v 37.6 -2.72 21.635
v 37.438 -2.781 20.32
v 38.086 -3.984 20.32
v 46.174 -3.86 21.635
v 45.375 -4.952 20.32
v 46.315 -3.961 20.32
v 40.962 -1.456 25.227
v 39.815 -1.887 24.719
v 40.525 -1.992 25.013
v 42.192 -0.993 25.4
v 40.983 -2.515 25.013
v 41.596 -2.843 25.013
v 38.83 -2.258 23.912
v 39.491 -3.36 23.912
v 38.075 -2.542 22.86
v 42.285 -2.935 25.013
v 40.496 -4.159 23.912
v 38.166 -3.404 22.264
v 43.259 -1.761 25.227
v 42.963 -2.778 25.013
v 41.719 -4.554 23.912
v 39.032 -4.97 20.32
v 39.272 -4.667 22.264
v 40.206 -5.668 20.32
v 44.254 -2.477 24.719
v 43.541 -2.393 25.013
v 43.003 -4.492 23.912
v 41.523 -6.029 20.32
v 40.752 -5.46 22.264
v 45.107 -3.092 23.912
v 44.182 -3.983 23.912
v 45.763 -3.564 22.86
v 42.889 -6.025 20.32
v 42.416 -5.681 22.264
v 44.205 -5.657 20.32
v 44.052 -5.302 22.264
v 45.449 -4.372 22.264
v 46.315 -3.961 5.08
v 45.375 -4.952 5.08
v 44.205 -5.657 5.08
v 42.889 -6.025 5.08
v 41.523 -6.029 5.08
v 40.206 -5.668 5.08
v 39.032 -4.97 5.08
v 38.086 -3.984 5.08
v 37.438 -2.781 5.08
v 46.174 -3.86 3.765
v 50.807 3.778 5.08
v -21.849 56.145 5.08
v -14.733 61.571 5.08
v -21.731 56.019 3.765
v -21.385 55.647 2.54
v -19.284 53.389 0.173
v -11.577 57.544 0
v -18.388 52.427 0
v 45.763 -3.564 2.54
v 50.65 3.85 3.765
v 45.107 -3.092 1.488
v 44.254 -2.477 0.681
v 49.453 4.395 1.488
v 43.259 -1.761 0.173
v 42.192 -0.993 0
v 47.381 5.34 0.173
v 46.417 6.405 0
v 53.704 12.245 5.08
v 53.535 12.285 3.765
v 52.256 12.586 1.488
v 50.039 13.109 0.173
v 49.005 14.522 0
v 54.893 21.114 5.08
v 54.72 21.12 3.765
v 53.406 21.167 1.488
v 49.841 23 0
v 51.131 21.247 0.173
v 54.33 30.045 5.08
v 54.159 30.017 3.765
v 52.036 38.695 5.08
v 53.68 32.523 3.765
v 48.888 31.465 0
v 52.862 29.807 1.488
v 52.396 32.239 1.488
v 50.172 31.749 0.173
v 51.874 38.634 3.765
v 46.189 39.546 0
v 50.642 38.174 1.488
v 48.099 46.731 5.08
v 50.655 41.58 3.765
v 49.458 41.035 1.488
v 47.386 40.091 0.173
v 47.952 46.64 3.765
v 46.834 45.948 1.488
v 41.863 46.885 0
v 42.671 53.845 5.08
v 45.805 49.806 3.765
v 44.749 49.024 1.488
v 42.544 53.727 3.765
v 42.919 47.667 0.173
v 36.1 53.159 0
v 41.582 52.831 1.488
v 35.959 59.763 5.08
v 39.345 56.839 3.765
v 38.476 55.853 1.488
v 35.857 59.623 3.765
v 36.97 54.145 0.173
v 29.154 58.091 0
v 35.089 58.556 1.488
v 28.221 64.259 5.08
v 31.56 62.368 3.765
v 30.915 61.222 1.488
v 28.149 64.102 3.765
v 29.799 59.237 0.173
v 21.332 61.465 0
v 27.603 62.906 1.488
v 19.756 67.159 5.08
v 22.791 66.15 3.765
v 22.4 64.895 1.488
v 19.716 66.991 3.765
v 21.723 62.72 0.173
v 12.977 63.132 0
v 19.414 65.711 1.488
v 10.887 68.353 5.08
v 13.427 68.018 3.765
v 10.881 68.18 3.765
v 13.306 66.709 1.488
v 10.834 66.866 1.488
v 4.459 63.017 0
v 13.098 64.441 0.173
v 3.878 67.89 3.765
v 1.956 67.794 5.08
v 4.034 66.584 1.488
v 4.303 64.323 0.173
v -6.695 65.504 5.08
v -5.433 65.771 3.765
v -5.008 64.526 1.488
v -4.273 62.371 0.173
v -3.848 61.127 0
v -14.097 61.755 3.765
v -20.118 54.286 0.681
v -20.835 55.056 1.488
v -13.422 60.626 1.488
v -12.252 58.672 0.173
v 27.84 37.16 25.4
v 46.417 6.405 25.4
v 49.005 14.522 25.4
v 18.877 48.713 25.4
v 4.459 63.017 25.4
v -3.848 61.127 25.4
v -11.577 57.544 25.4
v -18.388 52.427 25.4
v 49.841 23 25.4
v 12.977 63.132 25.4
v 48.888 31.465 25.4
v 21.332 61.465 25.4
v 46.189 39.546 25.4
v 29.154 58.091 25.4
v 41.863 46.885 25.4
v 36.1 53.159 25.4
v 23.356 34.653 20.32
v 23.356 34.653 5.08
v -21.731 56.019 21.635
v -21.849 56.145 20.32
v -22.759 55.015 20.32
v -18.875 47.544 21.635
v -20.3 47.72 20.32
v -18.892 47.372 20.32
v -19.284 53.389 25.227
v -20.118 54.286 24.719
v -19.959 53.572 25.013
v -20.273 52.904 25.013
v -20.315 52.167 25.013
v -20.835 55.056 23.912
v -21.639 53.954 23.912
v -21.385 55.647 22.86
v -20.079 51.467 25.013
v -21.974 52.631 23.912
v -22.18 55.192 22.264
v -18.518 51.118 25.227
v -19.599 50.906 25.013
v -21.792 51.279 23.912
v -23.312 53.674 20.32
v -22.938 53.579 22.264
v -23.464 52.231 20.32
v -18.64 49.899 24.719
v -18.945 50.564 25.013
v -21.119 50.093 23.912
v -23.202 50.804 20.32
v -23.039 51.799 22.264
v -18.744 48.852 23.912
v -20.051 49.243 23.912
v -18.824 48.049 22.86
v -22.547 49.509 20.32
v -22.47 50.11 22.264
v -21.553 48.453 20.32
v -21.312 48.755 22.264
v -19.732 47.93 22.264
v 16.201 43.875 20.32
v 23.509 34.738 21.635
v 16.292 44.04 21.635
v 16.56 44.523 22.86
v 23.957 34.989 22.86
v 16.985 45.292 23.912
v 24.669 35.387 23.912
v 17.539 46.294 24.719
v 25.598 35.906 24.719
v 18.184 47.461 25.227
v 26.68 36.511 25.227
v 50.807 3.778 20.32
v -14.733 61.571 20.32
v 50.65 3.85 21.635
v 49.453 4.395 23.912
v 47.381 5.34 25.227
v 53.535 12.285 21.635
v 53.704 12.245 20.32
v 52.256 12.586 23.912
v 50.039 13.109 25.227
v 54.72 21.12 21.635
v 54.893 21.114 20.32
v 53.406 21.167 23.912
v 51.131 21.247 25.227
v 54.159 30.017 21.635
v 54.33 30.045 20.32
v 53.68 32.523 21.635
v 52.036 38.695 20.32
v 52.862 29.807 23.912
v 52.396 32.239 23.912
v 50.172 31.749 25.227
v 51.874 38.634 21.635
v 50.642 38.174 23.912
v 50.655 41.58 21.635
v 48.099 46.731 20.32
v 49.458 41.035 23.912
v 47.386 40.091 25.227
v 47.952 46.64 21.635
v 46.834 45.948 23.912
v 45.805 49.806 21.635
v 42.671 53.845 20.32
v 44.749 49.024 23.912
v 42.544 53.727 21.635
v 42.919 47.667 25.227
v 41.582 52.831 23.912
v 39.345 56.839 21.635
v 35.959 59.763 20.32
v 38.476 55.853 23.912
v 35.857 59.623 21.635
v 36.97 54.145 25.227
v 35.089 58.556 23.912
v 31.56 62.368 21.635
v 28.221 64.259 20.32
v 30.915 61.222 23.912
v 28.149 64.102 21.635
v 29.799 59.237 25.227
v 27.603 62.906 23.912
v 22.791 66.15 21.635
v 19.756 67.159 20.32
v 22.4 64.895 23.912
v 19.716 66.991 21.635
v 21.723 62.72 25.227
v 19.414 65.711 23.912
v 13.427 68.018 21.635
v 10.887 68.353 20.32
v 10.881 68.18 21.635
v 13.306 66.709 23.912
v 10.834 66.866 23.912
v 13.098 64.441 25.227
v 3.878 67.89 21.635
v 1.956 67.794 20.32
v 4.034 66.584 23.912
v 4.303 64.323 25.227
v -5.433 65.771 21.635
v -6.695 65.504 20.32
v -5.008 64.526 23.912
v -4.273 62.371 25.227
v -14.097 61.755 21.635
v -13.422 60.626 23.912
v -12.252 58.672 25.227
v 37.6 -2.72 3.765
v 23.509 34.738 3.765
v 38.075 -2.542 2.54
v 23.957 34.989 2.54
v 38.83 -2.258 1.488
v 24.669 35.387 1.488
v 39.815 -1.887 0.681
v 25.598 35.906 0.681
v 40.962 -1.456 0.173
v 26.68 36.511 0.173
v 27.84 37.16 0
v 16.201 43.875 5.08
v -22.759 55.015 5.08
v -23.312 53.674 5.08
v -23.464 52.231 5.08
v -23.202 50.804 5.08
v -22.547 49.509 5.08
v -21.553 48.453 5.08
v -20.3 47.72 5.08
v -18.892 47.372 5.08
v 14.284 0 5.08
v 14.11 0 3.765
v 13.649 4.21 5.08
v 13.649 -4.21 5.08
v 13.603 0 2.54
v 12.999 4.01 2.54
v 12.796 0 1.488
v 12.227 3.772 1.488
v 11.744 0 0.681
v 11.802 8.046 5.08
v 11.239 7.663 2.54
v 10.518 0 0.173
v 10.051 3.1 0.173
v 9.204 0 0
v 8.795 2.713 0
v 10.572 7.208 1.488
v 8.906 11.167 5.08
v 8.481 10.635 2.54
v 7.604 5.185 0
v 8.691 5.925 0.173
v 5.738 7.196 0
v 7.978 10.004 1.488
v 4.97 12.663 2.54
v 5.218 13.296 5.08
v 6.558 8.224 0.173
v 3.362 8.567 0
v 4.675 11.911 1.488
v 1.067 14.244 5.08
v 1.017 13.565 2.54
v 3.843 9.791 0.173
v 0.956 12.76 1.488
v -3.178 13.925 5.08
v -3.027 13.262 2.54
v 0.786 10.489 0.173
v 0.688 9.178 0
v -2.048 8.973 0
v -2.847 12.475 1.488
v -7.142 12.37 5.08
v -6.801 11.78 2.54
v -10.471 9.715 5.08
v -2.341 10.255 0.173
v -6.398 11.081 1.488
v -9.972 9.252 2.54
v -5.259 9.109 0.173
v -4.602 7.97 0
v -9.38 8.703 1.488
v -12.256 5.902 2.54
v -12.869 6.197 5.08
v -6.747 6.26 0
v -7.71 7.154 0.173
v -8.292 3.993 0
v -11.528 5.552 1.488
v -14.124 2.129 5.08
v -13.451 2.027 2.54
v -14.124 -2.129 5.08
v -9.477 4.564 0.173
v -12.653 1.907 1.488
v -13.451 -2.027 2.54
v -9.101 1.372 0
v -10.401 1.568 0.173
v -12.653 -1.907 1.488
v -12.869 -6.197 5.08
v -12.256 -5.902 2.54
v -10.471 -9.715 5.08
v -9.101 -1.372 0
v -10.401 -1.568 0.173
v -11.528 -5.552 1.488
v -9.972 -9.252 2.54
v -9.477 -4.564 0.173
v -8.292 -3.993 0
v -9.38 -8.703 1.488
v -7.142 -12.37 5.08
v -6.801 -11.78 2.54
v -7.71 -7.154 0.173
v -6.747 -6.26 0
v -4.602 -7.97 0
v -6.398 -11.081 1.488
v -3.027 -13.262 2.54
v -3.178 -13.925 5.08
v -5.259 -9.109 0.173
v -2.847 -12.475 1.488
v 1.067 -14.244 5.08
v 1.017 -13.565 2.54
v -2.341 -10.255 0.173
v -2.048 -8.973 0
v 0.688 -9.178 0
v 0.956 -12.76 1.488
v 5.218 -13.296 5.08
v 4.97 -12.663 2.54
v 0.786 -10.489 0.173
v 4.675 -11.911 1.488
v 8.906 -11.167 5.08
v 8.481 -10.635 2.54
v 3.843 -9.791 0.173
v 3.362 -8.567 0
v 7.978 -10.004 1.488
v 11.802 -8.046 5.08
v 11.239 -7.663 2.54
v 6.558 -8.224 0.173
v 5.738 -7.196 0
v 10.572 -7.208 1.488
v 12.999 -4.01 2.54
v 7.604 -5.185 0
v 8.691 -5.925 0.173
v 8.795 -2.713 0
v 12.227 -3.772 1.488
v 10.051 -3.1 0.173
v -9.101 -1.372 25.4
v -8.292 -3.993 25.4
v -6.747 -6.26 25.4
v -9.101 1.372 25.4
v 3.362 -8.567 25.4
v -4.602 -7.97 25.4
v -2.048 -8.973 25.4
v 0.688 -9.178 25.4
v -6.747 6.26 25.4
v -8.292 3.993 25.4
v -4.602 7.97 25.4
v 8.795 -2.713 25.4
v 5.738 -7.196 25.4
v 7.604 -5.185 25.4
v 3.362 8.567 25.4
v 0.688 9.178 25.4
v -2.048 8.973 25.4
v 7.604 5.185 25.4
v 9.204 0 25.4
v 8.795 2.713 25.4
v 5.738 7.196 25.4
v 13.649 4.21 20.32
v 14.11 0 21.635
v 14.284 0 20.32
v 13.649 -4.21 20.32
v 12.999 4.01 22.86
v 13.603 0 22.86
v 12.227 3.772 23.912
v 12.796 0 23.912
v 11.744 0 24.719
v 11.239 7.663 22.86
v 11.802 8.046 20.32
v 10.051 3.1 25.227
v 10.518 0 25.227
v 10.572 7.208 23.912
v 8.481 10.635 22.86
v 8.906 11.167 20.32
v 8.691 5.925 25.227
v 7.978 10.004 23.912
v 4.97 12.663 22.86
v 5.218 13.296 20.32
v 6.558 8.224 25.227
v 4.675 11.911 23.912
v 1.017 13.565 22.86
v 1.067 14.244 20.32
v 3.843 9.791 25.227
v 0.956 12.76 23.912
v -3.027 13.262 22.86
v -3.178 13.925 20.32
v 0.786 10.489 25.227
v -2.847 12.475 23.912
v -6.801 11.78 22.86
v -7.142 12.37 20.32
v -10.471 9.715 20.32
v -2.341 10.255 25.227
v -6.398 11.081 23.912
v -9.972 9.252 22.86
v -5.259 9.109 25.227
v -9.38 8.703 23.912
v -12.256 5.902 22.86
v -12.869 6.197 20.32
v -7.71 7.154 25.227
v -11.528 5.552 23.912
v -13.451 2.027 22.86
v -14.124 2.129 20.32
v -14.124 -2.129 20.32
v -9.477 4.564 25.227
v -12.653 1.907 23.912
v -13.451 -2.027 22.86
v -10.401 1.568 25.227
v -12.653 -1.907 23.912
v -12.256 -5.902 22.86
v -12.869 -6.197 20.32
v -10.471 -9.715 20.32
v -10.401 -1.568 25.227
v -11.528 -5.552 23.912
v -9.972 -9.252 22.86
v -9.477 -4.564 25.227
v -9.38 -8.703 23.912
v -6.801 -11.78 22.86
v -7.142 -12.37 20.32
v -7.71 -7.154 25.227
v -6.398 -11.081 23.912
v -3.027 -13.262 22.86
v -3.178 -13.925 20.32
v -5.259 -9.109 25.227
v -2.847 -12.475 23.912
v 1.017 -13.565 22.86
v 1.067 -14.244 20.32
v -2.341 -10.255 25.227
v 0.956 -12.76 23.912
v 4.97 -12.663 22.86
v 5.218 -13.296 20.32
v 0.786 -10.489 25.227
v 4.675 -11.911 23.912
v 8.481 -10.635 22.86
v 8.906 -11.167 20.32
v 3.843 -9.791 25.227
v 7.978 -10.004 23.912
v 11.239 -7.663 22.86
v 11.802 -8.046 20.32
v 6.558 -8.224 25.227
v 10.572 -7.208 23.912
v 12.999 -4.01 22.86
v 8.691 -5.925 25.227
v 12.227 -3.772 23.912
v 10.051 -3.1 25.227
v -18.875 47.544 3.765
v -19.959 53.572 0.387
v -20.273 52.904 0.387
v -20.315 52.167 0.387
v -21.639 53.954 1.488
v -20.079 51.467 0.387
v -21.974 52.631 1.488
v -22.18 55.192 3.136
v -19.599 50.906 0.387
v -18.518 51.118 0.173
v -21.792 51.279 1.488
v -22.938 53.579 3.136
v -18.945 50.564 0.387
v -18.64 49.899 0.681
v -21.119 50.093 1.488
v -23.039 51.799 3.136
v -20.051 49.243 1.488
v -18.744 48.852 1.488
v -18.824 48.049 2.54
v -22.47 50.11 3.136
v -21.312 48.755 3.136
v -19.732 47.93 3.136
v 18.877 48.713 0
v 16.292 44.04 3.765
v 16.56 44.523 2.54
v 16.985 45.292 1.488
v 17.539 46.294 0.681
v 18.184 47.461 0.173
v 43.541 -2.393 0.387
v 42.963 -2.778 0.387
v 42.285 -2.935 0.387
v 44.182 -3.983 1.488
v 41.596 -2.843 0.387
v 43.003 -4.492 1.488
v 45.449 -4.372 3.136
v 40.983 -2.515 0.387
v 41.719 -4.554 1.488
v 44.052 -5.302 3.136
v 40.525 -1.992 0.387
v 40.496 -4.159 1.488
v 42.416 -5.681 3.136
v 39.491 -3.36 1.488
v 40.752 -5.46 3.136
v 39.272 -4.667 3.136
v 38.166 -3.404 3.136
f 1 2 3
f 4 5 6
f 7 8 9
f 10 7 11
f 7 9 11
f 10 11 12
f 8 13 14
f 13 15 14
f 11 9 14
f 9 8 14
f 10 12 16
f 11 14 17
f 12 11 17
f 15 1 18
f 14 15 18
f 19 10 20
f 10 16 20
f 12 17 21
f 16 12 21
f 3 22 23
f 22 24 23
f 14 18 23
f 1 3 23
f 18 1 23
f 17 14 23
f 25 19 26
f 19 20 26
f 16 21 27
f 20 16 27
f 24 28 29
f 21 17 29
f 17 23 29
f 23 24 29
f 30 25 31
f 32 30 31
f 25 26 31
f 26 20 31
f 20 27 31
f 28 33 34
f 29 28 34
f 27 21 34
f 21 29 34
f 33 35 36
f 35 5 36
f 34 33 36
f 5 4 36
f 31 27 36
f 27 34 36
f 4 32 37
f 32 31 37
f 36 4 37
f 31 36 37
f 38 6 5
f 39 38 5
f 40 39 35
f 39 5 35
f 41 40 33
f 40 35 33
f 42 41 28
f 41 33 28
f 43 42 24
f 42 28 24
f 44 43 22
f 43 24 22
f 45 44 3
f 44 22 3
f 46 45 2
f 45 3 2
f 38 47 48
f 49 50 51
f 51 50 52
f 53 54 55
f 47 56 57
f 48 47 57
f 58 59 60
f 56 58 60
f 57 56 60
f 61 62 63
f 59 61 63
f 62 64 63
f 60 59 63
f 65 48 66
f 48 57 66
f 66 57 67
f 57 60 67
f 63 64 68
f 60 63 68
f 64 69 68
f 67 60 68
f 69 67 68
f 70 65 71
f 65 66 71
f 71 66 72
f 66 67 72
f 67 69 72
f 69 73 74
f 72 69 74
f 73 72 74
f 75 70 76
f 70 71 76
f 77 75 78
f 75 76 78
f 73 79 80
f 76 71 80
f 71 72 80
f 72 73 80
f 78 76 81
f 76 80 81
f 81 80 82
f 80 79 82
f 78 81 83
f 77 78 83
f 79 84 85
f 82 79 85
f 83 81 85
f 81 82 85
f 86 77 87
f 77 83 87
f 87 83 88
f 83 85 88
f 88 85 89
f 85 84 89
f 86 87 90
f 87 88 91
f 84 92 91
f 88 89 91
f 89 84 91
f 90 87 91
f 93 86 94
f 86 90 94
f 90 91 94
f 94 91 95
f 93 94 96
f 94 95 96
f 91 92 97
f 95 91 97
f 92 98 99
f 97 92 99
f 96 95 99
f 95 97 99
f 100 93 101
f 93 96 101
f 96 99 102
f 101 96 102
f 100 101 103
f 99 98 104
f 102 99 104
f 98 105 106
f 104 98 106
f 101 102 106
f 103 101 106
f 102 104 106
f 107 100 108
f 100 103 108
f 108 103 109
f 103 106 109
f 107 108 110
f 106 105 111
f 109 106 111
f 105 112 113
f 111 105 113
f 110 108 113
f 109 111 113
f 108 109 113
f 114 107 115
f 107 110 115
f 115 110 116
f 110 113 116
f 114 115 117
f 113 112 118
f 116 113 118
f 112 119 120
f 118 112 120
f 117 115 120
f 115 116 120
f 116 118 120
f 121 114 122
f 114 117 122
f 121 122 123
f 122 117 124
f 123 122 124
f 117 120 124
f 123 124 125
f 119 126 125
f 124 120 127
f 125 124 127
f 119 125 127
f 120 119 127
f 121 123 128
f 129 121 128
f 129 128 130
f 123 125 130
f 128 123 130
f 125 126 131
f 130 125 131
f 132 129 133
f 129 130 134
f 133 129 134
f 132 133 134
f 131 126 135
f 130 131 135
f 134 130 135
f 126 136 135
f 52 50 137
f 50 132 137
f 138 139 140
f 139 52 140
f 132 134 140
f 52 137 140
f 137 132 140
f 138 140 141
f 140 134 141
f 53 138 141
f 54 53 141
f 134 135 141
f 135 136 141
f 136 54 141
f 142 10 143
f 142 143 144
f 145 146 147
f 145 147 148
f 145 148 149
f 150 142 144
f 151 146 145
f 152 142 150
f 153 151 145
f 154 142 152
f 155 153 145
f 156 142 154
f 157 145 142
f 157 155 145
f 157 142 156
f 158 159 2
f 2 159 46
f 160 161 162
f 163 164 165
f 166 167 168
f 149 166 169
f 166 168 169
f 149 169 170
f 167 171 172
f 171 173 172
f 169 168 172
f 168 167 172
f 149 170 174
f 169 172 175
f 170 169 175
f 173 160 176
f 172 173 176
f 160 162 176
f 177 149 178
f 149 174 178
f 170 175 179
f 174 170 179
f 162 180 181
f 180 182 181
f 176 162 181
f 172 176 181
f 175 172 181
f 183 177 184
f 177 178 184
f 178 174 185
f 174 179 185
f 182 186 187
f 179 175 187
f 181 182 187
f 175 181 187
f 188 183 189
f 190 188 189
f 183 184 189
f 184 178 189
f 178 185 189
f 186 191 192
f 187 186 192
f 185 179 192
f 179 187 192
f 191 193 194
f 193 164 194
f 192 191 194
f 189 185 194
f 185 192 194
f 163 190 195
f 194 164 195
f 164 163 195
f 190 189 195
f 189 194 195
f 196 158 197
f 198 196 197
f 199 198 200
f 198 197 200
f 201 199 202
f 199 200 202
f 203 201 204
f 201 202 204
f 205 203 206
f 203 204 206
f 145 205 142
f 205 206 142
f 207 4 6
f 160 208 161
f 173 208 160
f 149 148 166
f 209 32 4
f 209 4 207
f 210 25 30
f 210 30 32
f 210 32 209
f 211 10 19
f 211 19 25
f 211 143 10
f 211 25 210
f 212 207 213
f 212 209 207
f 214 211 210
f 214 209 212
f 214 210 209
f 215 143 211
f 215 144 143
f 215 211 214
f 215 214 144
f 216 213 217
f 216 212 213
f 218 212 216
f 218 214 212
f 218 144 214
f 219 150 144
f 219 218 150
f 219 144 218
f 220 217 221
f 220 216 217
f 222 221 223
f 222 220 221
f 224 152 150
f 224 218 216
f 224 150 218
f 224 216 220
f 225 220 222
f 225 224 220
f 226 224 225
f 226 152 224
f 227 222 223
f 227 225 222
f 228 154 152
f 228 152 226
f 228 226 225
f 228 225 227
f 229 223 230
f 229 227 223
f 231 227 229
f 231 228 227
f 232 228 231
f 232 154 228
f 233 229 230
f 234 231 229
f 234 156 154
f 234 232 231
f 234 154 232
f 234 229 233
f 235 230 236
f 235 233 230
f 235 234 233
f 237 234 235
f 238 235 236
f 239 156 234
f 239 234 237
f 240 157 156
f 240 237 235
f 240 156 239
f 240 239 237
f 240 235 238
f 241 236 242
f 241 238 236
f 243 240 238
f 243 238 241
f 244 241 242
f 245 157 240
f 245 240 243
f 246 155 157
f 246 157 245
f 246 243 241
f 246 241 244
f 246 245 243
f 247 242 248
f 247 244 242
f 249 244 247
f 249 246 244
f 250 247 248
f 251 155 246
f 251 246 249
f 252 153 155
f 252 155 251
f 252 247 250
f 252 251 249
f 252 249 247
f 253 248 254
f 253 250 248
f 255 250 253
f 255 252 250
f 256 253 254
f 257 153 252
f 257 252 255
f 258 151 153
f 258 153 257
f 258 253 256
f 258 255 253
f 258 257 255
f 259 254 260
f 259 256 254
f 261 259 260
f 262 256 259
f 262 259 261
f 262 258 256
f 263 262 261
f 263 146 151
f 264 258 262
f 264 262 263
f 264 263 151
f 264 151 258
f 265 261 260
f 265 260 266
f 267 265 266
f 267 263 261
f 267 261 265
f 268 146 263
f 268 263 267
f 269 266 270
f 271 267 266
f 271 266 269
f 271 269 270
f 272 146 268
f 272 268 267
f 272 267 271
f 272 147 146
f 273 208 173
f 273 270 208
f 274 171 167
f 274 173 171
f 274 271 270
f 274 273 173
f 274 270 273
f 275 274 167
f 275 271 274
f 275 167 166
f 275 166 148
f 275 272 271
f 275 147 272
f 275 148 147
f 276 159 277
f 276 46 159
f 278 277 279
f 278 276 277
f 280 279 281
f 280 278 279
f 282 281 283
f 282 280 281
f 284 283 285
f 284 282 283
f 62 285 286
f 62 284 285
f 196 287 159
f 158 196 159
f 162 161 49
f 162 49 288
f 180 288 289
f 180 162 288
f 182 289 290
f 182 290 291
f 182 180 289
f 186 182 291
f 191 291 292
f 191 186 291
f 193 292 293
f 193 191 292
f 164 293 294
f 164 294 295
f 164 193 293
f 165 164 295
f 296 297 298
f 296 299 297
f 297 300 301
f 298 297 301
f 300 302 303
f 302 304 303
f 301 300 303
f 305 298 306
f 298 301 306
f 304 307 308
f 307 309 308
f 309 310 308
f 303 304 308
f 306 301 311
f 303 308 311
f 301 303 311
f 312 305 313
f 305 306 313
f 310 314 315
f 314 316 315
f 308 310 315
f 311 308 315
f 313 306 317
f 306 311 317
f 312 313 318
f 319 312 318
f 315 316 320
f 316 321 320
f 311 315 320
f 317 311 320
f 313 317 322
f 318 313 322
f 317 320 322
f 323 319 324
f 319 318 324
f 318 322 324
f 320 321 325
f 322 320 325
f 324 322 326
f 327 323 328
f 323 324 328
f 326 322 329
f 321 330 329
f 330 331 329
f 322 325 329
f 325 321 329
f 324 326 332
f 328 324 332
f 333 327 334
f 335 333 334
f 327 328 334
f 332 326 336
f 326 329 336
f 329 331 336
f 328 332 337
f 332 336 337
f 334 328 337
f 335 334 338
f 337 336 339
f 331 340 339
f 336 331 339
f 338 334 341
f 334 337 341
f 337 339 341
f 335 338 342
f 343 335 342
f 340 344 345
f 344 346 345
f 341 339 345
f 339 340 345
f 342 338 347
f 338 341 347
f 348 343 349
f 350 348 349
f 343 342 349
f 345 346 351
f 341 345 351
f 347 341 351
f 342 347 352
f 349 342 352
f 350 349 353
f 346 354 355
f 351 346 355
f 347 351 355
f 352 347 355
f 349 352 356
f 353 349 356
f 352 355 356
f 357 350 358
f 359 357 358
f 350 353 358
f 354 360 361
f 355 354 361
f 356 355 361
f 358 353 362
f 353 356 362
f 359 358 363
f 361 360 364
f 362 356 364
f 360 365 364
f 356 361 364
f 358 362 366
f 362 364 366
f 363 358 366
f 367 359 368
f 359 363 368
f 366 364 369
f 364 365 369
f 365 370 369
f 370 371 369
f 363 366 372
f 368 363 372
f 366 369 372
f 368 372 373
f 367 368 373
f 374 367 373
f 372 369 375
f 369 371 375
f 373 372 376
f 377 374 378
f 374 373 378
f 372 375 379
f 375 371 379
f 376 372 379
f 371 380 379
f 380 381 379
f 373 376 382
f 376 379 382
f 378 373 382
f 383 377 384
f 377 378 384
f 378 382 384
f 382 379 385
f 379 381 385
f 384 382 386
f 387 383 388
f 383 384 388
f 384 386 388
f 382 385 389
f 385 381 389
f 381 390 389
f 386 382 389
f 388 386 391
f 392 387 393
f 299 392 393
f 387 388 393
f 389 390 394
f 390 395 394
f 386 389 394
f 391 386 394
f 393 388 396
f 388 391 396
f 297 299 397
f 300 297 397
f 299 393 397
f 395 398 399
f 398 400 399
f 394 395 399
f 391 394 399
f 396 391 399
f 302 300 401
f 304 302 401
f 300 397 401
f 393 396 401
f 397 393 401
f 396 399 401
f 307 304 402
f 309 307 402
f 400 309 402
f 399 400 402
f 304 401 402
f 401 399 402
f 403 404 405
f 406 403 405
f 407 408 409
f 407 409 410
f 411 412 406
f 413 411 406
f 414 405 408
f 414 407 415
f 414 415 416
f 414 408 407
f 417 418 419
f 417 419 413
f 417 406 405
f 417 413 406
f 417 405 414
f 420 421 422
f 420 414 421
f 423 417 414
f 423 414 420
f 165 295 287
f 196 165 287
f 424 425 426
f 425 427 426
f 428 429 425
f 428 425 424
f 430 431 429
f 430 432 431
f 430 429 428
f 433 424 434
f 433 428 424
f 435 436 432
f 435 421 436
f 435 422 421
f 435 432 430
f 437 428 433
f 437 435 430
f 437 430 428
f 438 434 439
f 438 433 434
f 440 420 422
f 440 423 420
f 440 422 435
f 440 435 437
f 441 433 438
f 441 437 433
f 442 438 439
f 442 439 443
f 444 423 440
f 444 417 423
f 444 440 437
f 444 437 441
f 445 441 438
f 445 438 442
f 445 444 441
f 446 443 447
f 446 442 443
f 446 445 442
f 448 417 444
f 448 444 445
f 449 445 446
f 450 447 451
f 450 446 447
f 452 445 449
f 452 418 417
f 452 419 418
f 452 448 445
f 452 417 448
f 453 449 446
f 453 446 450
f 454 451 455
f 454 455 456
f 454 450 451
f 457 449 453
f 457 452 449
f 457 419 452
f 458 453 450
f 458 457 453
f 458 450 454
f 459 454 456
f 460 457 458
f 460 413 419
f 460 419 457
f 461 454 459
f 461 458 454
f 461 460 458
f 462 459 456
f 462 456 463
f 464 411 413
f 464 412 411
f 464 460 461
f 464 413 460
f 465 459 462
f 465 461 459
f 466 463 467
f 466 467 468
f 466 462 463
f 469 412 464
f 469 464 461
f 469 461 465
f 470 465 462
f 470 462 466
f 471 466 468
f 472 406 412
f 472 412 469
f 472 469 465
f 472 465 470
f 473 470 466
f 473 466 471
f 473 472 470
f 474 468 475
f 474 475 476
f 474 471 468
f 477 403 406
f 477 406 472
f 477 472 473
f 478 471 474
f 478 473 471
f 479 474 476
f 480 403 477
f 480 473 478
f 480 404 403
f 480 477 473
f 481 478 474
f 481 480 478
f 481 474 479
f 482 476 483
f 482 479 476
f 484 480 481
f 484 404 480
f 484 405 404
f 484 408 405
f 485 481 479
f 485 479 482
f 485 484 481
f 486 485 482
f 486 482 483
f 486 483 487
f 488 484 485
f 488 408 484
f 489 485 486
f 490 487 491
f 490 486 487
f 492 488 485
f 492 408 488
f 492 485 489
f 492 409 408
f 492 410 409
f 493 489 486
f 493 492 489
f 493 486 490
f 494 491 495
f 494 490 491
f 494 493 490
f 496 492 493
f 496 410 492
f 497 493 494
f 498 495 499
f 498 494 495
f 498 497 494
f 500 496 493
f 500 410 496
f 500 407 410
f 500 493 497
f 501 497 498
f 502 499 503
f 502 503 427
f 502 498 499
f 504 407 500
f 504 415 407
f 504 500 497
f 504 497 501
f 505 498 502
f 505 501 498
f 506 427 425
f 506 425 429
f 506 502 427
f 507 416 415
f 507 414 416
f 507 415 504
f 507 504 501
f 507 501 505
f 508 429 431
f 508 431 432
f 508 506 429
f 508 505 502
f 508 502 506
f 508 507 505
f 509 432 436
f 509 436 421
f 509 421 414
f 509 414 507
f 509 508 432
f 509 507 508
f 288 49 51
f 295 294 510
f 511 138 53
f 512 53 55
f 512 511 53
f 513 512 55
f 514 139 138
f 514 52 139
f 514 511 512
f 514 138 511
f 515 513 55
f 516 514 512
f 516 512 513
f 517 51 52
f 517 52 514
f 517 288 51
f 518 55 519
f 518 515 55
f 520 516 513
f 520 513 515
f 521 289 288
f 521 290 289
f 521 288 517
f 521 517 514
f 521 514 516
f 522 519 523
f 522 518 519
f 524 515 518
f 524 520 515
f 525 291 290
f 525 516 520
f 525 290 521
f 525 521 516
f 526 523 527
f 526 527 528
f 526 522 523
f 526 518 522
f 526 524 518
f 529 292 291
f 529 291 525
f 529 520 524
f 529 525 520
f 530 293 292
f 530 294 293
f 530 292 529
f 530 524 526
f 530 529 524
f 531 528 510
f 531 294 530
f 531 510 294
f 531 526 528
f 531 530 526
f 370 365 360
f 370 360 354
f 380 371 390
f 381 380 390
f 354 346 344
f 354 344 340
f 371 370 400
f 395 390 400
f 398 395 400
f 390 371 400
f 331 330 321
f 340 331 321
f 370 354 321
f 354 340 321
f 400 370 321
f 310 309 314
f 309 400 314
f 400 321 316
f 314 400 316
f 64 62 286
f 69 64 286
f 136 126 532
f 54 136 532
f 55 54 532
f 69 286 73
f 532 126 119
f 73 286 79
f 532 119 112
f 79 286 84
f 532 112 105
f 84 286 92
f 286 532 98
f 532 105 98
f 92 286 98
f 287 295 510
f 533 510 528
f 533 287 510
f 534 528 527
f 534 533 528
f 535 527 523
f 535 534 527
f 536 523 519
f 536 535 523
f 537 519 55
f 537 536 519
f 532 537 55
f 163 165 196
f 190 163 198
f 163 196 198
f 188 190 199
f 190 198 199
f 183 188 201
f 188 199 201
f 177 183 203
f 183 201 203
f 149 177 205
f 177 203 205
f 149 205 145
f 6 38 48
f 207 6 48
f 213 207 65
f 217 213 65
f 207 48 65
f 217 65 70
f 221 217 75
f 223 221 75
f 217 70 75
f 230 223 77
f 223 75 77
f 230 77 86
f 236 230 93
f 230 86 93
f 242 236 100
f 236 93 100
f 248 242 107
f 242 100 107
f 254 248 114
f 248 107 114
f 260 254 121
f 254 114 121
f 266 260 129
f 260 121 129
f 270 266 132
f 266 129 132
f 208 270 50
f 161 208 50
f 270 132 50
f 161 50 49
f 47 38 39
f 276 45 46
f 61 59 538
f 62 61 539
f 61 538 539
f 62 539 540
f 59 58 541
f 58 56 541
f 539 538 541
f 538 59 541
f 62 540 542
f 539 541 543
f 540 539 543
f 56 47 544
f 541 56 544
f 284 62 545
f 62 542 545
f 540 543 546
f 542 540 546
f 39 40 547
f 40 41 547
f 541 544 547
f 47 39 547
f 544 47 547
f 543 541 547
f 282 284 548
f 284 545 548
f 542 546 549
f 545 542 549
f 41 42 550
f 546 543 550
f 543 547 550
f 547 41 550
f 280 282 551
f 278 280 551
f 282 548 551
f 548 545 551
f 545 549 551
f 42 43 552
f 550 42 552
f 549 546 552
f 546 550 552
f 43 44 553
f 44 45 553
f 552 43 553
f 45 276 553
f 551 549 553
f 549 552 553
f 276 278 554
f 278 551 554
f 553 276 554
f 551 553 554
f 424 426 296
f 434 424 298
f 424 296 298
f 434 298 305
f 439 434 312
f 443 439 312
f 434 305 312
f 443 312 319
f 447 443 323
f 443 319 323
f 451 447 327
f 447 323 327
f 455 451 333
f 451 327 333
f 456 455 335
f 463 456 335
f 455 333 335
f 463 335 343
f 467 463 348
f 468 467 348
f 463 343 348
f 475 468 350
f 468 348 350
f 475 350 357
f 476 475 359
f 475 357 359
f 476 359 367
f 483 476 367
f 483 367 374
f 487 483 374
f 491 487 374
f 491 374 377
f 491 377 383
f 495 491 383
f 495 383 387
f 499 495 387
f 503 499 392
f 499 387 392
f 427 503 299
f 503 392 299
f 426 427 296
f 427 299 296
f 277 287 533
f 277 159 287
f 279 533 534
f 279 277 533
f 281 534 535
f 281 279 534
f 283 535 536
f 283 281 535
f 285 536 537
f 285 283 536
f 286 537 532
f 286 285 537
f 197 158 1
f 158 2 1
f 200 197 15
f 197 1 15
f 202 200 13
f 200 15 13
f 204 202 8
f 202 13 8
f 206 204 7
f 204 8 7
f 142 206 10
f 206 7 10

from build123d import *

# Parameters (mm, degrees)
F1_DEPTH = 25.4
F0_R     = 14.2835162245
F3_R     = 5.08
F4_R     = 5.08


# Not quite as in the source:
# - a feature of the source that left no trace in its solid (it failed there, or was rolled back) is left out


with BuildPart() as f1:
    # F0 (on Top) → F1 (new body)
    with BuildSketch(Plane.XY):
        with BuildLine():
            ThreePointArc((40.4053583261, -10.6703329711), (38.948965984, 57.412745276), (-28.5416923943, 48.3332269014))
            Line((-28.5416923943, 48.3332269014), (16.2010799613, 43.8748665274))
            Line((16.2010799613, 43.8748665274), (23.3559507397, 34.6526309968))
            Line((23.3559507397, 34.6526309968), (40.4053583261, -10.6703329711))
        make_face()
    extrude(amount=F1_DEPTH)

    # F4
    f4_edges = [f1.edges().sort_by_distance(p)[0] for p in [
        (38.948966, 57.412745, 0),
        (19.778515, 39.263749, 0),
        (31.880655, 11.991149, 0),
        (-6.170306, 46.104047, 0),
        (19.778515, 39.263749, 25.4),
        (40.405358, -10.670333, 12.7),
        (31.880655, 11.991149, 25.4),
        (-28.541692, 48.333227, 12.7),
        (38.948966, 57.412745, 25.4),
        (-6.170306, 46.104047, 25.4),
    ]]
    fillet(f4_edges, radius=F4_R)


with BuildPart() as f1b:
    # F0 (on Top) → F1, piece 2 (new body)
    with BuildSketch(Plane.XY):
        Circle(F0_R)
    extrude(amount=F1_DEPTH)

    # F3
    f3_edges = [f1b.edges().sort_by_distance(p)[0] for p in [
        (-14.283516, 0, 0),
        (-14.283516, 0, 25.4),
        (14.283516, 0, 12.7),
    ]]
    fillet(f3_edges, radius=F3_R)


solid = Compound([f1.part, f1b.part])
